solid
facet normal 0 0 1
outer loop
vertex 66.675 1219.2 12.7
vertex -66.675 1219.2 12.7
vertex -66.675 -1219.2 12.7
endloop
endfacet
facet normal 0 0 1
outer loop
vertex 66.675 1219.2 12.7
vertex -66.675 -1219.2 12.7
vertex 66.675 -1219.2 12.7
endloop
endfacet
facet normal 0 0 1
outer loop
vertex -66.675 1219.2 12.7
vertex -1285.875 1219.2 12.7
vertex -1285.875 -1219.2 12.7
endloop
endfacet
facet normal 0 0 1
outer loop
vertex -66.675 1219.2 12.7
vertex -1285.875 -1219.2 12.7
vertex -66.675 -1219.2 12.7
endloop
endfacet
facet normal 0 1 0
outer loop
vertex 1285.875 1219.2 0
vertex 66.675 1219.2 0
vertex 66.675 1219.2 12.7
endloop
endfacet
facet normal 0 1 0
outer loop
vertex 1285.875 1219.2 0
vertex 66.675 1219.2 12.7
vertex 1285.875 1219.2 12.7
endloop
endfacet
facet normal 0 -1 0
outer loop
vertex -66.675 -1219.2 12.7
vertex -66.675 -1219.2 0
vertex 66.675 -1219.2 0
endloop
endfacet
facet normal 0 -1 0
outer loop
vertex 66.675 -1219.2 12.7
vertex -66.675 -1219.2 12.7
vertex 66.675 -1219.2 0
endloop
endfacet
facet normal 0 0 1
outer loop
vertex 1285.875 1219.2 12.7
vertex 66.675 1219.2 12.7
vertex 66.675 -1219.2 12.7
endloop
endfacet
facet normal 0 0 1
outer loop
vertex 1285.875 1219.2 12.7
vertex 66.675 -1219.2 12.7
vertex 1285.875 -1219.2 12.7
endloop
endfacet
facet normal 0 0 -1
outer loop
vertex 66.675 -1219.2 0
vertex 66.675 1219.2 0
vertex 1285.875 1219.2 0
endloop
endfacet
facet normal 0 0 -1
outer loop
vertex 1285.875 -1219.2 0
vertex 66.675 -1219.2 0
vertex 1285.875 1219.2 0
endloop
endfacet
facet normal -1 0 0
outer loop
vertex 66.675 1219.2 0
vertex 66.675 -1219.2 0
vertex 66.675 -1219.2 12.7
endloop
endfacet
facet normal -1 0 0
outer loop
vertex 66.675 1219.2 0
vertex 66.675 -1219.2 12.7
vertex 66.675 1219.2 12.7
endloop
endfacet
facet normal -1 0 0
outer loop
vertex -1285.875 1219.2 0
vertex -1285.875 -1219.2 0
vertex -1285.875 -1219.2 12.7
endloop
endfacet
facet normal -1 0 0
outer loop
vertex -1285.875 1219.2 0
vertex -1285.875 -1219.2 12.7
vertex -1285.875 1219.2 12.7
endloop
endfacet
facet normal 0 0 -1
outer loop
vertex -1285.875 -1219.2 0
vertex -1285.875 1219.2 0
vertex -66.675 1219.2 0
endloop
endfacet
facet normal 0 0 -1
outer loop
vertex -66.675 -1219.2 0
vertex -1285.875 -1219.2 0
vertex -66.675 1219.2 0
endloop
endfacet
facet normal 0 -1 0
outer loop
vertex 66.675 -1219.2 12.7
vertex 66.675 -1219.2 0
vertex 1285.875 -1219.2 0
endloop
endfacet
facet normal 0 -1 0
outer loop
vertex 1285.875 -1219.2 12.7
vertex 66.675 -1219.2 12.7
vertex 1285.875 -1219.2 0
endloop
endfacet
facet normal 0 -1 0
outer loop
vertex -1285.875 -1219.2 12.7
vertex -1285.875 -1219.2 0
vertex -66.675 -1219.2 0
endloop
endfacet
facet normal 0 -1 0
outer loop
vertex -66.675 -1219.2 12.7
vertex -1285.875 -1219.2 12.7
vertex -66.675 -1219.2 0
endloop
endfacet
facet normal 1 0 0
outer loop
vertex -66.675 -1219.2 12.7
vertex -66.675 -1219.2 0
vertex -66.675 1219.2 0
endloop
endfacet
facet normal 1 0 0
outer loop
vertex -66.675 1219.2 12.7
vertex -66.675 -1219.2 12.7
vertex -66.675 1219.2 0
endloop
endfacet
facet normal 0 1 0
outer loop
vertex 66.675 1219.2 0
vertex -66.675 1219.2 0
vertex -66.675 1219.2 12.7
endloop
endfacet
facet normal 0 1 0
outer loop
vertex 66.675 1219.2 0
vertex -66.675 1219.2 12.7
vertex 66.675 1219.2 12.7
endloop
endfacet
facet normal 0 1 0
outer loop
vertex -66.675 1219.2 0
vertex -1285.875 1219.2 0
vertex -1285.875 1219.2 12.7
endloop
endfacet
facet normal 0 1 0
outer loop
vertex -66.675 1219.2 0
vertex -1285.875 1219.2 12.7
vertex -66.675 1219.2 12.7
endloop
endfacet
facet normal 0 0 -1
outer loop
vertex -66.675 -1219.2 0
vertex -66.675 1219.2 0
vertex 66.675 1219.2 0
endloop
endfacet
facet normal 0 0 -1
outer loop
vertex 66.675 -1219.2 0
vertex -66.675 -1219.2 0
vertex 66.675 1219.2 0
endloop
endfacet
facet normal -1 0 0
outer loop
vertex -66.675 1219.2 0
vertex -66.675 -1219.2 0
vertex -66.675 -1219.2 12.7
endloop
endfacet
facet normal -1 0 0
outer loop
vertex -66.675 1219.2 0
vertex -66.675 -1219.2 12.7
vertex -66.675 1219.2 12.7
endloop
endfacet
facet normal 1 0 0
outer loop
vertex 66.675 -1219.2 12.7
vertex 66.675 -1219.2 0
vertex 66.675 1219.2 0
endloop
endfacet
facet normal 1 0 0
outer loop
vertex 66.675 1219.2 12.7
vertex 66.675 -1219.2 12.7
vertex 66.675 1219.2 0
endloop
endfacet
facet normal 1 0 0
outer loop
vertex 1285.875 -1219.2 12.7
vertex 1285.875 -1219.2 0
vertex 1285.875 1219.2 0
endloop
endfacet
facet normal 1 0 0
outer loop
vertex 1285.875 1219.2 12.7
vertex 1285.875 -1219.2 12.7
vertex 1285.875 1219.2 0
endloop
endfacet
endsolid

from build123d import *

# Parameters (mm, degrees)
F0_W     = 1219.2
F0_H     = 2438.4
F1_DEPTH = 12.7
F2_DEPTH = 12.7
F0_W_2   = 133.35
F3_DEPTH = 12.7


with BuildPart() as f1:
    # F0 (on Top) → F1 (new body)
    with BuildSketch(Plane.XY):
        with Locations((-676.275, 0)):
            Rectangle(F0_W, F0_H)
    extrude(amount=F1_DEPTH)


with BuildPart() as f2:
    # F0 (on Top) → F2 (new body)
    with BuildSketch(Plane.XY):
        with Locations((676.275, 0)):
            Rectangle(F0_W, F0_H)
    extrude(amount=F2_DEPTH)


with BuildPart() as f3:
    # F0 (on Top) → F3 (new body)
    with BuildSketch(Plane.XY):
        Rectangle(F0_W_2, F0_H)
    extrude(amount=F3_DEPTH)


solid = Compound([f1.part, f2.part, f3.part])
